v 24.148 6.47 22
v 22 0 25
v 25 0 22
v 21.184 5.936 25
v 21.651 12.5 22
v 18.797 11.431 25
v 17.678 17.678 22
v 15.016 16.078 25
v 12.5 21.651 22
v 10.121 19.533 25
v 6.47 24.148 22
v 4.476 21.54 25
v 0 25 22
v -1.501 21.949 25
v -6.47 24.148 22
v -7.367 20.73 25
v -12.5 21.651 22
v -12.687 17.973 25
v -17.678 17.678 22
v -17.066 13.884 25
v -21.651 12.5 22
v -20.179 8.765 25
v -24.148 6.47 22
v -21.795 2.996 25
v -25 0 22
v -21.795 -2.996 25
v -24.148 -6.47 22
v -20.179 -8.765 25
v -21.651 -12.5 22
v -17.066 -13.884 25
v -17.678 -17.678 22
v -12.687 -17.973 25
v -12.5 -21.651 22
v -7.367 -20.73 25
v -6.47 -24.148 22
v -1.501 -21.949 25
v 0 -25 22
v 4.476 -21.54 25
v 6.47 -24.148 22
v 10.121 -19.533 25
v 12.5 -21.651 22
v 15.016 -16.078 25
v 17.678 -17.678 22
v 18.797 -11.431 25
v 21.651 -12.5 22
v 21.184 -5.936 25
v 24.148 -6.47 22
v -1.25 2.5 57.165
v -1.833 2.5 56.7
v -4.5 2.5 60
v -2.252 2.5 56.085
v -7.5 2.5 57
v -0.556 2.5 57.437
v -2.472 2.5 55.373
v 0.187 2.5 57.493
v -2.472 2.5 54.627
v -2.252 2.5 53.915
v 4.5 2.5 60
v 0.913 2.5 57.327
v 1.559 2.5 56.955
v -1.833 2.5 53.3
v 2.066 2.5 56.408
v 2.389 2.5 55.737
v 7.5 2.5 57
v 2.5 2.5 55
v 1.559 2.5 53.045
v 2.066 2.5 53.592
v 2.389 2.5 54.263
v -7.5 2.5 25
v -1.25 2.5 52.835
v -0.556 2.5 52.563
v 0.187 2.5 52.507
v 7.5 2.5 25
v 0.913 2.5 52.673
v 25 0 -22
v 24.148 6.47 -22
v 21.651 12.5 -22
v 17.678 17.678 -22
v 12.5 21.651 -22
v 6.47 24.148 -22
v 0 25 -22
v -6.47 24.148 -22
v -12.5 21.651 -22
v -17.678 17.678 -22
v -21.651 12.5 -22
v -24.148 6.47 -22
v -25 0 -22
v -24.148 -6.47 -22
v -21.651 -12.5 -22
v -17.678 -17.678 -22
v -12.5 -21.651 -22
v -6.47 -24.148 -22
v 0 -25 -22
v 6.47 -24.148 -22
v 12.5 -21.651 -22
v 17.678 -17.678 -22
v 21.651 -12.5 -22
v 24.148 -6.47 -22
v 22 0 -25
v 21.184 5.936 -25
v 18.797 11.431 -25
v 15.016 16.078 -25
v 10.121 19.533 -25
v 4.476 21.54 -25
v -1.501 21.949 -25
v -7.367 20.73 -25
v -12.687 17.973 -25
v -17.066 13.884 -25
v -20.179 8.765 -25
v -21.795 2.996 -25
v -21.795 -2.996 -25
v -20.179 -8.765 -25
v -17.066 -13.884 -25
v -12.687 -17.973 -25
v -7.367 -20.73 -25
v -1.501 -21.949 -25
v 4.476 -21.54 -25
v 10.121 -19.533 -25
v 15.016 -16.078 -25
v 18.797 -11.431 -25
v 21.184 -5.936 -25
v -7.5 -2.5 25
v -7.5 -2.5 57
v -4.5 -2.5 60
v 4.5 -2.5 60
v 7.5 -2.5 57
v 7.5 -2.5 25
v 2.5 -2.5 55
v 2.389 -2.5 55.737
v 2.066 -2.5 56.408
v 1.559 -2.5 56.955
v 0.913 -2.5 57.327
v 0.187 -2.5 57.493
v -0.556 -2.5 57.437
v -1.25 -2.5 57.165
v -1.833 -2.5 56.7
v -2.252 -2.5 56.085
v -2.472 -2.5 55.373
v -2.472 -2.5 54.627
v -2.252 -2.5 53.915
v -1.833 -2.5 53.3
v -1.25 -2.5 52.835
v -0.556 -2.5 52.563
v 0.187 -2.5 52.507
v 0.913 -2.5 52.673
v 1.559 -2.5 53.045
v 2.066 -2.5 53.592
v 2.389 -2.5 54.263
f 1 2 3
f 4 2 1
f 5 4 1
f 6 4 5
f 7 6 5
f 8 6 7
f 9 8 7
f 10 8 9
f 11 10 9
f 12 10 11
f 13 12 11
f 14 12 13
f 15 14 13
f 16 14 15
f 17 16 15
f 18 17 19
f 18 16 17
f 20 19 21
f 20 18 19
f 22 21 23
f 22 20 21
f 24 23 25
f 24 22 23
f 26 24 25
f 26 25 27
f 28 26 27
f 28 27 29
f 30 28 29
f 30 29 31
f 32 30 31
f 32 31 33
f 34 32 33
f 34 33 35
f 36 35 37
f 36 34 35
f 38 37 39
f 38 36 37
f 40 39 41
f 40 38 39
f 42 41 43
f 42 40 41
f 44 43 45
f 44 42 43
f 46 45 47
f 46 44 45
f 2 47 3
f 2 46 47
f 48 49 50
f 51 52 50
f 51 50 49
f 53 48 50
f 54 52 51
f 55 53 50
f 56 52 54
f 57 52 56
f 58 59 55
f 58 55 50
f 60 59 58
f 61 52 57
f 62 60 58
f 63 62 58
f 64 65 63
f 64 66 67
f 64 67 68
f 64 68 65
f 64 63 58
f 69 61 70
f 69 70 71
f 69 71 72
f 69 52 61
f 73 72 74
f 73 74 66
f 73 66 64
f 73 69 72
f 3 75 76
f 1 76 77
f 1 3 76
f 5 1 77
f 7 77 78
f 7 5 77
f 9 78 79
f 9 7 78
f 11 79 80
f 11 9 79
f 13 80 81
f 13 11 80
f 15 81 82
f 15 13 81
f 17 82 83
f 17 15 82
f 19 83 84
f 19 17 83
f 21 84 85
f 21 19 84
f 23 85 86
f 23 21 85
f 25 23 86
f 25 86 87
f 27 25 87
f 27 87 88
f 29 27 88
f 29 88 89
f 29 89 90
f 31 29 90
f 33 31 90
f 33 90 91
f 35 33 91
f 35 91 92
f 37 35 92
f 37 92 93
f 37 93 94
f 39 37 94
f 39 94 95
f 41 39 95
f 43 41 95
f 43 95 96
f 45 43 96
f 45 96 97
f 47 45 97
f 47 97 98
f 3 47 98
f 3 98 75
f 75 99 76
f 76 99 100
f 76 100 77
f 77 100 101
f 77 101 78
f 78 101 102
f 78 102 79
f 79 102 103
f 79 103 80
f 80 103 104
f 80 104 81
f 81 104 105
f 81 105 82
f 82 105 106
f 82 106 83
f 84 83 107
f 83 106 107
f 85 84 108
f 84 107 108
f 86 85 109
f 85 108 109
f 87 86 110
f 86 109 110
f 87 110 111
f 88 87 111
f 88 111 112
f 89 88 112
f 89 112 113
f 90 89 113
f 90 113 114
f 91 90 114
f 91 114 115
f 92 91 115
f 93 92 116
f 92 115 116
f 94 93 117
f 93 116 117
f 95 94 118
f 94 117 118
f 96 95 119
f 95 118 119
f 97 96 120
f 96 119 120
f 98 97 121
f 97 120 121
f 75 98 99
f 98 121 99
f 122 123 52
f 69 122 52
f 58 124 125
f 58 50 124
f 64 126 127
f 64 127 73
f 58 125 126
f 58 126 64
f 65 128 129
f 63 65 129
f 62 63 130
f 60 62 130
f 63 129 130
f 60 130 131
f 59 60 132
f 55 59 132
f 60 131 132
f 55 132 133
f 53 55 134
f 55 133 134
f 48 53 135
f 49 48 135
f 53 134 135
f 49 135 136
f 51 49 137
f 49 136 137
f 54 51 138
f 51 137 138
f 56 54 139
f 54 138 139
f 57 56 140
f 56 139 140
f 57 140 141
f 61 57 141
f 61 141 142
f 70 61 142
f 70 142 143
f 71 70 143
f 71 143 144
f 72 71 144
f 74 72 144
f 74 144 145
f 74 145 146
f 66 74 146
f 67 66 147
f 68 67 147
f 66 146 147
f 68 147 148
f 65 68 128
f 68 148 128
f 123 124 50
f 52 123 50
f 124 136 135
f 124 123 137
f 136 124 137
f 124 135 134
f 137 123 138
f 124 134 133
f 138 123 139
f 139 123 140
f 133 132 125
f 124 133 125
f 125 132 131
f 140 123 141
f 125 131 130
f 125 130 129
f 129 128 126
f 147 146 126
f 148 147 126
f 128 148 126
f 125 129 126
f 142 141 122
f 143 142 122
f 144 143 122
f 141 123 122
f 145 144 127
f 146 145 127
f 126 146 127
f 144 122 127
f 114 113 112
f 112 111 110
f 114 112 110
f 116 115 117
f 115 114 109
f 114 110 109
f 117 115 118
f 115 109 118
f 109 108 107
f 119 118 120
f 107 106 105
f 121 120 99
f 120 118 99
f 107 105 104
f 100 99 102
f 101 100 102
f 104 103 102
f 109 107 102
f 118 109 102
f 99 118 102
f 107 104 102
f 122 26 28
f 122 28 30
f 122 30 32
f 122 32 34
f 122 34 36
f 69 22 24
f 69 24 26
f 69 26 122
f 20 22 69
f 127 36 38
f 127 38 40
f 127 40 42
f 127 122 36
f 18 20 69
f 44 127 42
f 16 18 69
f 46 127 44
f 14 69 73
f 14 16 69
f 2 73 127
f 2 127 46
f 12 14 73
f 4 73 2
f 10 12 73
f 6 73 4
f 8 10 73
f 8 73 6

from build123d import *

# Parameters (mm, degrees)
F0_R     = 25
F1_DEPTH = 25
F2_W     = 15
F2_H     = 5
F3_DEPTH = 35
F4_R     = 2.5
F5_DEPTH = 5
F6_SIZE  = 3


with BuildPart() as f1:
    # F0 (on Top) → F1 (new body, symmetric)
    with BuildSketch(Plane.XY):
        Circle(F0_R)
    extrude(amount=F1_DEPTH, both=True)

    # F2 (on face) → F3 (join)
    with BuildSketch(Plane.XY.offset(25)):
        Rectangle(F2_W, F2_H)
    extrude(amount=F3_DEPTH)

    # F4 (on face) → F5 (cut, through all)
    with BuildSketch(Plane.XZ.offset(2.5)):
        with Locations((0, 55)):
            Circle(F4_R)
    extrude(amount=-F5_DEPTH, mode=Mode.SUBTRACT)

    # F6
    f6_edges = [f1.edges().sort_by_distance(p)[0] for p in [
        (-25, 0, 25),
        (-25, 0, -25),
        (-7.5, 0, 60),
        (7.5, 0, 60),
    ]]
    chamfer(f6_edges, length=F6_SIZE)


solid = f1.part
